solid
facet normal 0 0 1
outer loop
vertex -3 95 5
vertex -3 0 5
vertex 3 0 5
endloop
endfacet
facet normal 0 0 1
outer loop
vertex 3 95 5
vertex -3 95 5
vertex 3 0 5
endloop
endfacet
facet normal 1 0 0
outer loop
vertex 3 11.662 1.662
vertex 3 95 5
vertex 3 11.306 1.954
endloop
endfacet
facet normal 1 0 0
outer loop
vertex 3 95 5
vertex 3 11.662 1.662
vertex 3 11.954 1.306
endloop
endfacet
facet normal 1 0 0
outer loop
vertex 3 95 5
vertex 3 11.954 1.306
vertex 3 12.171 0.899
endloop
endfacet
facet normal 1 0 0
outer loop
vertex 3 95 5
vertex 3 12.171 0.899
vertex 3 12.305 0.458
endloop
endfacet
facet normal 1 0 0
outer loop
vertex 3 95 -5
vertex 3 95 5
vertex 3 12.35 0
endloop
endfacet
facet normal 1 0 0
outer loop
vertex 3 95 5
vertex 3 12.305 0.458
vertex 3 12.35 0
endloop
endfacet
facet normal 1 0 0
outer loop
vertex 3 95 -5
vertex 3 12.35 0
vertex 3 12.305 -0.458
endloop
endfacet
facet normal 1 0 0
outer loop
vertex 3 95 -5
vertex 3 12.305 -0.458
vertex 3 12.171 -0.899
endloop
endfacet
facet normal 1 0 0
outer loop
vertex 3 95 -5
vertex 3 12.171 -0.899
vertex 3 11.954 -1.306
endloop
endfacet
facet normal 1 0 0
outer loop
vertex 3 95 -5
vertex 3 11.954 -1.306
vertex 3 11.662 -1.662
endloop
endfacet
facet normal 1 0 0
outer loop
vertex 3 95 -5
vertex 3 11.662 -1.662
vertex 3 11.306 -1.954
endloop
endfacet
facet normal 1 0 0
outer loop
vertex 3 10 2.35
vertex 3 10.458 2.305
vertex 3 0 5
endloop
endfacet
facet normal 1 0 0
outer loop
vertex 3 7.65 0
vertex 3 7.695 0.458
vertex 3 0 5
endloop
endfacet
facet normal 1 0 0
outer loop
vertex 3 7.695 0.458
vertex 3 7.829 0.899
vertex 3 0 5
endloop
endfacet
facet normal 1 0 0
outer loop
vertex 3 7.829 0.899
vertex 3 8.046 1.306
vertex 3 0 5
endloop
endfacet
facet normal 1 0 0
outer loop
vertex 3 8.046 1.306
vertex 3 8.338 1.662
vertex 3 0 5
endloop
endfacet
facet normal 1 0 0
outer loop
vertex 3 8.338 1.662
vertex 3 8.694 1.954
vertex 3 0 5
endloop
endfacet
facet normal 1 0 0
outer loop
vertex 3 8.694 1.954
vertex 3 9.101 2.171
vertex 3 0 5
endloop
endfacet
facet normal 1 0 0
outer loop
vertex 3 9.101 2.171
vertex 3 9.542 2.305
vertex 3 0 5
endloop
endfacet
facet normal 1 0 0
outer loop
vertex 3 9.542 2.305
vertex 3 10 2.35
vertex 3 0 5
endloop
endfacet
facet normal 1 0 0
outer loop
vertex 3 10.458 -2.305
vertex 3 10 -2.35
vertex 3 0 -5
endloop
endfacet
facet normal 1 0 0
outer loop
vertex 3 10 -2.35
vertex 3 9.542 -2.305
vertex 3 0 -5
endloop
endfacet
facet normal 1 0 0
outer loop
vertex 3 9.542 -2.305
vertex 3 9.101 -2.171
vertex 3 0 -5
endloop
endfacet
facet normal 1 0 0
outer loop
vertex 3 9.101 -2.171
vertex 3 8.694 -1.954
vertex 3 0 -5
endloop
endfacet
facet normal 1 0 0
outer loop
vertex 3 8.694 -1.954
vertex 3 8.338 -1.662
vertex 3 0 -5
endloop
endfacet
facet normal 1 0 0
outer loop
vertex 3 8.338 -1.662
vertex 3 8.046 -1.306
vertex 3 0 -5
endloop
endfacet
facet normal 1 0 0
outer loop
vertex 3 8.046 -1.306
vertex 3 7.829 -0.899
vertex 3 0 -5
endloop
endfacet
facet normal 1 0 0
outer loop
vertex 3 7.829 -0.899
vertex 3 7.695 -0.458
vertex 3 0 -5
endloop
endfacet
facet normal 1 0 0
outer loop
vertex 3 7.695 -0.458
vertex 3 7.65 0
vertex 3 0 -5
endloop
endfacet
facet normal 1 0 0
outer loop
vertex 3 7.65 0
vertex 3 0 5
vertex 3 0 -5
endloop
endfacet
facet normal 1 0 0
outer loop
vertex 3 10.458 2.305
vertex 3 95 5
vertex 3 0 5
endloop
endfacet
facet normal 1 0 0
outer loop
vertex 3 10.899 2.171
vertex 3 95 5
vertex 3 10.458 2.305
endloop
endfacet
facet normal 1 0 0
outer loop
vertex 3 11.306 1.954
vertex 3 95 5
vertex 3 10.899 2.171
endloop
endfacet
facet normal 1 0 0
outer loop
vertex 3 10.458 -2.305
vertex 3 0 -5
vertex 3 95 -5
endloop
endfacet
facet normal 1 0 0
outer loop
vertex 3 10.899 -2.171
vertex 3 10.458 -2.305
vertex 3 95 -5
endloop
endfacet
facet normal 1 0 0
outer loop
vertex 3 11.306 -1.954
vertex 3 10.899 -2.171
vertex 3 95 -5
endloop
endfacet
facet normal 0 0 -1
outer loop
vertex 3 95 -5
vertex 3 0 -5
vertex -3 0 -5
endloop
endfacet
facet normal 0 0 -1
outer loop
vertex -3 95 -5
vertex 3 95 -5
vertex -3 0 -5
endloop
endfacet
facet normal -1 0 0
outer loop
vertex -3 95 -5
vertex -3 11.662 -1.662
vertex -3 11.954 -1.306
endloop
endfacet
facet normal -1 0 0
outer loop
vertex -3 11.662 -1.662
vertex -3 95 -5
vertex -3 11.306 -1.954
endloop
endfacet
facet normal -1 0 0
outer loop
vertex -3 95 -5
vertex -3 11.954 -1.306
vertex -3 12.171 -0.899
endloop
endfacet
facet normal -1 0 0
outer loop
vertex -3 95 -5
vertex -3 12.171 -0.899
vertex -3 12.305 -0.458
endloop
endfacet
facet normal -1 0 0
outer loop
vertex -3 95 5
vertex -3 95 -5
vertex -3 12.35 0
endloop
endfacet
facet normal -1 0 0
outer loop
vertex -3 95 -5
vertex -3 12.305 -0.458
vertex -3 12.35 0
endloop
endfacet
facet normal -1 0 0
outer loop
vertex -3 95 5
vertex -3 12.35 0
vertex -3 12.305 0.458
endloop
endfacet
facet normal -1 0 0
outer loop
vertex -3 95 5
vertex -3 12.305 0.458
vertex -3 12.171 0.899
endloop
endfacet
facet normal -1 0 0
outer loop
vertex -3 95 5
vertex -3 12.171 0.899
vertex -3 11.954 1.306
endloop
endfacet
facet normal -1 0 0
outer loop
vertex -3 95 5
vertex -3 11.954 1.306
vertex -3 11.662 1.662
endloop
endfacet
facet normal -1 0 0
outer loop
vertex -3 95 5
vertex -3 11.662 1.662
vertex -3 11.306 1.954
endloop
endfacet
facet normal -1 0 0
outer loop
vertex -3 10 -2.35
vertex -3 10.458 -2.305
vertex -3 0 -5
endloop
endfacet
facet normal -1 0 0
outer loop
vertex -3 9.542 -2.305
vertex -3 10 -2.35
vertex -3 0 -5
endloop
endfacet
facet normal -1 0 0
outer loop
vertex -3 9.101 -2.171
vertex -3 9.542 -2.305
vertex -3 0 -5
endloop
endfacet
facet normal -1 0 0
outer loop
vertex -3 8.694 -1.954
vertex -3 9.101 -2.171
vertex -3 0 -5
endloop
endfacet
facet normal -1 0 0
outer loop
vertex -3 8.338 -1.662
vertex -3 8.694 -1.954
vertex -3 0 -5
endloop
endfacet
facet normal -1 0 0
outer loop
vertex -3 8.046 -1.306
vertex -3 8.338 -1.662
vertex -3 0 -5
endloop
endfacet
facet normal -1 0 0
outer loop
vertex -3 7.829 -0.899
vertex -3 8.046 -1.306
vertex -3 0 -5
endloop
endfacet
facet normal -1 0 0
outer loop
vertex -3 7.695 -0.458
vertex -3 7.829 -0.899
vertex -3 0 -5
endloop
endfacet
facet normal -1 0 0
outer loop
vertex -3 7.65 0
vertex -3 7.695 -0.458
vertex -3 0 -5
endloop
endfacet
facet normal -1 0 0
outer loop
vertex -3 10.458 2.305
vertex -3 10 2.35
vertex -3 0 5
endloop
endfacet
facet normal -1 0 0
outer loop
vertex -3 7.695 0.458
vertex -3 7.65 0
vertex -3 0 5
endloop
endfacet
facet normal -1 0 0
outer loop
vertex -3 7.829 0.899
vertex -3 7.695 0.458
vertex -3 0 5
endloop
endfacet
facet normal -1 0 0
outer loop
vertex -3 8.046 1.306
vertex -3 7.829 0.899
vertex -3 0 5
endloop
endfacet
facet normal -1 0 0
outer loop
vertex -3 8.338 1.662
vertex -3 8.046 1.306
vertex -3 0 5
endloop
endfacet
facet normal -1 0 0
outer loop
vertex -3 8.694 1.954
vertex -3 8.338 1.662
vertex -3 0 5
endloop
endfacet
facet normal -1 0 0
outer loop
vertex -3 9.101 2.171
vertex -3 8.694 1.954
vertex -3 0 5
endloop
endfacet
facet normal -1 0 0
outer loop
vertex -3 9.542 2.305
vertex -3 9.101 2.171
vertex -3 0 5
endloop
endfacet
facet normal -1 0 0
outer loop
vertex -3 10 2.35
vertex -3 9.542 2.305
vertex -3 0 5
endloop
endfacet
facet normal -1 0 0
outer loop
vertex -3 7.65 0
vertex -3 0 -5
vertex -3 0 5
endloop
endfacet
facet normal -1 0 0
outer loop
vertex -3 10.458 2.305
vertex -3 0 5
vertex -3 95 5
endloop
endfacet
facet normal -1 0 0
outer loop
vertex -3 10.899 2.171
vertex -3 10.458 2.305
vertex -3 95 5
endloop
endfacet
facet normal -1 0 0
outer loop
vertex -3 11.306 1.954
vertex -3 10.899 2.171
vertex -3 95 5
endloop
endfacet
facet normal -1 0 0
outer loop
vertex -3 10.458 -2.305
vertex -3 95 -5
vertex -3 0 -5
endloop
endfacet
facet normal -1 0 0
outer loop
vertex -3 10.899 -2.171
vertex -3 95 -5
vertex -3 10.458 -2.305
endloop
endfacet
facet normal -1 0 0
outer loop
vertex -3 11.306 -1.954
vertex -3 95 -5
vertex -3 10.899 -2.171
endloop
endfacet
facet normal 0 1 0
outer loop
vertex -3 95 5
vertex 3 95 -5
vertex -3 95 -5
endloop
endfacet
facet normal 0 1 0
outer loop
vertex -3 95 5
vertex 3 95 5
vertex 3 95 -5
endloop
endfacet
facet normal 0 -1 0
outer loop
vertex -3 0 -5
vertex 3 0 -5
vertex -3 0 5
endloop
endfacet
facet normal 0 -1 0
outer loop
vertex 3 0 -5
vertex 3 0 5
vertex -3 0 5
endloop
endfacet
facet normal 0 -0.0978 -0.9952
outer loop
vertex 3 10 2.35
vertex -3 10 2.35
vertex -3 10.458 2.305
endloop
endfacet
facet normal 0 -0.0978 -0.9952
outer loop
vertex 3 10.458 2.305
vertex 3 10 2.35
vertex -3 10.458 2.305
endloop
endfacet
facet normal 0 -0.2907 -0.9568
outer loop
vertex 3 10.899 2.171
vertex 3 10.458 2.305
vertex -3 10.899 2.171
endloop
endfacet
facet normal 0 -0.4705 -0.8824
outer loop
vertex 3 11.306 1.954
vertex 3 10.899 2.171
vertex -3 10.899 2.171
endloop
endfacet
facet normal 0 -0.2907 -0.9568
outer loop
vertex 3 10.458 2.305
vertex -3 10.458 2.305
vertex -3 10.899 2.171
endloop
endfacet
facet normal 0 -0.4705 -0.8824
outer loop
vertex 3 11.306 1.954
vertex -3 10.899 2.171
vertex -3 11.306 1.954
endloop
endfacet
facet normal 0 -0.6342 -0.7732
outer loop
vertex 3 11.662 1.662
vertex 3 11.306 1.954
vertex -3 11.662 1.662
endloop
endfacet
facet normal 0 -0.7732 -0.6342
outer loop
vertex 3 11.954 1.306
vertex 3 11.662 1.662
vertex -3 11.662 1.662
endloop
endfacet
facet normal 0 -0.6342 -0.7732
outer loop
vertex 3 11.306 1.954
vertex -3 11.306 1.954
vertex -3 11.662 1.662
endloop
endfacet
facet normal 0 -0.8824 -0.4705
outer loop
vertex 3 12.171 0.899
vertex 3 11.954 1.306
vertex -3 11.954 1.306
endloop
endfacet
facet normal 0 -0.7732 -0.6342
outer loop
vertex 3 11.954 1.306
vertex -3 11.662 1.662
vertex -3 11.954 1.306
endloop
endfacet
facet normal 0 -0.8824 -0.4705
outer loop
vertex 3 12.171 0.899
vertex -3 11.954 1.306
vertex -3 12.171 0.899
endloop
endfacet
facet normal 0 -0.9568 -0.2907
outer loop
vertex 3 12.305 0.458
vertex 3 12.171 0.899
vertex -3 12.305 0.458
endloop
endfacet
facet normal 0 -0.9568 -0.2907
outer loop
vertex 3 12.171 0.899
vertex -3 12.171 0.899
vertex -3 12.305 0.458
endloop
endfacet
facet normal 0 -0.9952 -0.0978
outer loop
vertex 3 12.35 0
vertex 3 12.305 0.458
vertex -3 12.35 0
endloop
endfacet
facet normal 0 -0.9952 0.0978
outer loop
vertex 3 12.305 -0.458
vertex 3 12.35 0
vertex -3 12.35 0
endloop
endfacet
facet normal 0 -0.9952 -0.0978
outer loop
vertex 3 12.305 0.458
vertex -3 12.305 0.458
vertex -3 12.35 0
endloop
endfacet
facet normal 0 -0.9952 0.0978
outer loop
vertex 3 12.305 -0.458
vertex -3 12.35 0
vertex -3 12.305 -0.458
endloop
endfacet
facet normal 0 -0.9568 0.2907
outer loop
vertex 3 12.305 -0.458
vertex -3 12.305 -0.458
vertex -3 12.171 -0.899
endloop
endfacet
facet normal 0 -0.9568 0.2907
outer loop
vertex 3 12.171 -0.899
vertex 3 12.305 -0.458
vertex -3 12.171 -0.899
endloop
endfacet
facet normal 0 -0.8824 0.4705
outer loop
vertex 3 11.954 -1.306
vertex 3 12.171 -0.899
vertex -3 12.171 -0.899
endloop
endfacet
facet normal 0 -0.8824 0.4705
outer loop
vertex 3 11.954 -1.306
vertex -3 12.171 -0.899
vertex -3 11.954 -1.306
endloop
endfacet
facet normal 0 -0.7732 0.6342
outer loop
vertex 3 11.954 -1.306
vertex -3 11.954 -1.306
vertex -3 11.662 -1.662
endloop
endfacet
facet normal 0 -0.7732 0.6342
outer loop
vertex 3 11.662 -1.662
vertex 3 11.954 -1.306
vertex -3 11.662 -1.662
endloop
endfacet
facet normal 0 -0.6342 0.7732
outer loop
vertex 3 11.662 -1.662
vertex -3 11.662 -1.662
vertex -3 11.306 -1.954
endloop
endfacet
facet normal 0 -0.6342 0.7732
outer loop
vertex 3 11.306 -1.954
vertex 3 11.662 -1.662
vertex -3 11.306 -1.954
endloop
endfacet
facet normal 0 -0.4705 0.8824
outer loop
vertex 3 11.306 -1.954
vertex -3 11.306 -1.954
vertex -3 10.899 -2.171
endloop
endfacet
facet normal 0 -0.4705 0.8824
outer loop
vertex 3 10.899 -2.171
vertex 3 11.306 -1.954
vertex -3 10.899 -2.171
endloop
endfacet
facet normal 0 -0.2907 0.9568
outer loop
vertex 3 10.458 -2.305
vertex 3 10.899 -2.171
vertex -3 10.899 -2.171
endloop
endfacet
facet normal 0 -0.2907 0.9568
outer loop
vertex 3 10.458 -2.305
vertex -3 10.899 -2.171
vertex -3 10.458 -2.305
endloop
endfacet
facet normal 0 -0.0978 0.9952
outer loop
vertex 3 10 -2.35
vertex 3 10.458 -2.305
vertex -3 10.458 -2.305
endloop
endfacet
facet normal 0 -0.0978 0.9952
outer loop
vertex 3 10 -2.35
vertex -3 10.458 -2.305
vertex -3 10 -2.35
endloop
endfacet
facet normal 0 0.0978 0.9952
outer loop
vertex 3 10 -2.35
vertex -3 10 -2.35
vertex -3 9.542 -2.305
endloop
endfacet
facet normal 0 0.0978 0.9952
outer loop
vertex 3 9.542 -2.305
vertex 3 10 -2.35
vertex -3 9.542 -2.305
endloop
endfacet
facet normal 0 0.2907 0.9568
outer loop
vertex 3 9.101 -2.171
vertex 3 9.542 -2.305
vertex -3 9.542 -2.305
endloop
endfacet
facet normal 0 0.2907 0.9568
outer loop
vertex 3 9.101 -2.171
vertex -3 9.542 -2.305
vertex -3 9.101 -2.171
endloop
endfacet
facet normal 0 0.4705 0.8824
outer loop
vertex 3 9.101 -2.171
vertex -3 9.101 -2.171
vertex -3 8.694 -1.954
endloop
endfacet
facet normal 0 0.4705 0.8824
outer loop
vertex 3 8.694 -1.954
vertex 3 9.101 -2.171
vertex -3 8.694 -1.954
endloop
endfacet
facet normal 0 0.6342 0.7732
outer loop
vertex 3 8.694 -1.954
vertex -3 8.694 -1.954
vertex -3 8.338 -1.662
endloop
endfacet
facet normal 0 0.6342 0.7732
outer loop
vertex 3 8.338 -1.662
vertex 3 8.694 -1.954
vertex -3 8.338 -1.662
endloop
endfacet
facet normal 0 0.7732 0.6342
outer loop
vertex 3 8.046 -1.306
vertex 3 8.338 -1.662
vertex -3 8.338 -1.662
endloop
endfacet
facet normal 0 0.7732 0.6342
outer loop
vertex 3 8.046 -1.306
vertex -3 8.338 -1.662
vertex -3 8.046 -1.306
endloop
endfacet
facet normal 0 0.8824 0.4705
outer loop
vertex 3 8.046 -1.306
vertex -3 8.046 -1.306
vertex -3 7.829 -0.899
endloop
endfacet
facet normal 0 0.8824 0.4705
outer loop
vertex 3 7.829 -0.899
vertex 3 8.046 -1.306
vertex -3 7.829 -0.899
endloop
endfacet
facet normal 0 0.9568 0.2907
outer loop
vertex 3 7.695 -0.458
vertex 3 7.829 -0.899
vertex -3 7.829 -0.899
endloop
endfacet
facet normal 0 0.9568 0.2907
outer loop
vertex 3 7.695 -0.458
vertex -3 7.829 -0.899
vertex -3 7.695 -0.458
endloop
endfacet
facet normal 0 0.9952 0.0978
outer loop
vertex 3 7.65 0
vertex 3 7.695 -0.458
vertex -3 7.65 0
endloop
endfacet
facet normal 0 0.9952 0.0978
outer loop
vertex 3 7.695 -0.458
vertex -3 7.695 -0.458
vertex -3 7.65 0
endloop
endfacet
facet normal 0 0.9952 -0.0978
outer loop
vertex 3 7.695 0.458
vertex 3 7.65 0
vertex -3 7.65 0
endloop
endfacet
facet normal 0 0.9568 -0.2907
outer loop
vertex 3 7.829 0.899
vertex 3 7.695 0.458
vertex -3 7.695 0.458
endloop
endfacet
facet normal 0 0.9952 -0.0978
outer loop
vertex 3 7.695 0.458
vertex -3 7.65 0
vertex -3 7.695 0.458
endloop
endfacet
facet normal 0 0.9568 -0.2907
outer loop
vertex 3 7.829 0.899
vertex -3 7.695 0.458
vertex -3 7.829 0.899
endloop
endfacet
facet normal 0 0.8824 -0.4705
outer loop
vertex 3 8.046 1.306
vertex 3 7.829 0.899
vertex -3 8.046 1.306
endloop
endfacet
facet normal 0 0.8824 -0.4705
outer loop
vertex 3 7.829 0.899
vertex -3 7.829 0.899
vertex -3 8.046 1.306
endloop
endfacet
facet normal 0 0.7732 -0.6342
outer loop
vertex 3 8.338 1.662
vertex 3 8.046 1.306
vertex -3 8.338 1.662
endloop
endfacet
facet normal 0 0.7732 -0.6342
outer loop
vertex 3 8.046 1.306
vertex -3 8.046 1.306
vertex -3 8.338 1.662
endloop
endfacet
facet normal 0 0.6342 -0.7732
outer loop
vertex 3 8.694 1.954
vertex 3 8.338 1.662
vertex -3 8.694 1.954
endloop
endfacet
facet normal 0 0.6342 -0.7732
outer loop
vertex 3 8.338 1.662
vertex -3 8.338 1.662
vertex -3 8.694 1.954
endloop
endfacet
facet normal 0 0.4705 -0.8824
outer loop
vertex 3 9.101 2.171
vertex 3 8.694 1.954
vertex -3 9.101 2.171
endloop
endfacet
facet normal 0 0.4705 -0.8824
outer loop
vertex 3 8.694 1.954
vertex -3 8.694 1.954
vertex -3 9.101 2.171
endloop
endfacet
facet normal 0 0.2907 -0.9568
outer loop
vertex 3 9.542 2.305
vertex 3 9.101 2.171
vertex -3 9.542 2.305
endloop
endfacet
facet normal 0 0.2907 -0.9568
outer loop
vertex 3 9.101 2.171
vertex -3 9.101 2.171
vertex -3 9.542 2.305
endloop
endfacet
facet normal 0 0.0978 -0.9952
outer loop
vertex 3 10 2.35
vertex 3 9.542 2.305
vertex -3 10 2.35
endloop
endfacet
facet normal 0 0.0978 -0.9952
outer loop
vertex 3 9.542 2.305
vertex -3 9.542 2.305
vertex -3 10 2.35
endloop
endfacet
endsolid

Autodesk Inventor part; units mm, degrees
ref_plane "YZ Plane" through (0, 0, 0) normal (1, 0, 0) x (0, 1, 0)
ref_plane "XZ Plane" through (0, 0, 0) normal (0, 1, 0) x (-1, 0, 0)
ref_plane "XY Plane" through (0, 0, 0) normal (0, 0, 1) x (1, 0, 0)
sketch "Sketch1" plane through (0, 0, 0) normal (0, 1, 0) x (-1, 0, 0)
  line L0 (-3, -5) -> (3, -5)
  line L1 (3, -5) -> (3, 5)
  line L2 (3, 5) -> (-3, 5)
  line L3 (-3, 5) -> (-3, -5)
  line L4 (-3, -5) -> (3, 5) construction
  line L5 (3, -5) -> (-3, 5) construction
  point P0 (0, 0)
  dimension "d0" = 6
  dimension "d1" = 10
extrude "Extrusion1" add sketch "Sketch1" along normal blind 95
sketch "Sketch2" plane through (-3, 0, -5) normal (-1, 0, 0) x (0, 0, 1)
  line L0 (0, 0) -> (10, 0) projected
  line L1 (0, 0) -> (0, 95) projected
  circle A0 centre (5, 10) radius 2.35
  line L2 (5, 0) -> (5, 20) construction
  dimension "d4" = 4.7
  dimension "d5" = 10
extrude "Extrusion2" cut sketch "Sketch2" against normal up to next
properties part number "WoodArm" material "Wood (Cherry)"
